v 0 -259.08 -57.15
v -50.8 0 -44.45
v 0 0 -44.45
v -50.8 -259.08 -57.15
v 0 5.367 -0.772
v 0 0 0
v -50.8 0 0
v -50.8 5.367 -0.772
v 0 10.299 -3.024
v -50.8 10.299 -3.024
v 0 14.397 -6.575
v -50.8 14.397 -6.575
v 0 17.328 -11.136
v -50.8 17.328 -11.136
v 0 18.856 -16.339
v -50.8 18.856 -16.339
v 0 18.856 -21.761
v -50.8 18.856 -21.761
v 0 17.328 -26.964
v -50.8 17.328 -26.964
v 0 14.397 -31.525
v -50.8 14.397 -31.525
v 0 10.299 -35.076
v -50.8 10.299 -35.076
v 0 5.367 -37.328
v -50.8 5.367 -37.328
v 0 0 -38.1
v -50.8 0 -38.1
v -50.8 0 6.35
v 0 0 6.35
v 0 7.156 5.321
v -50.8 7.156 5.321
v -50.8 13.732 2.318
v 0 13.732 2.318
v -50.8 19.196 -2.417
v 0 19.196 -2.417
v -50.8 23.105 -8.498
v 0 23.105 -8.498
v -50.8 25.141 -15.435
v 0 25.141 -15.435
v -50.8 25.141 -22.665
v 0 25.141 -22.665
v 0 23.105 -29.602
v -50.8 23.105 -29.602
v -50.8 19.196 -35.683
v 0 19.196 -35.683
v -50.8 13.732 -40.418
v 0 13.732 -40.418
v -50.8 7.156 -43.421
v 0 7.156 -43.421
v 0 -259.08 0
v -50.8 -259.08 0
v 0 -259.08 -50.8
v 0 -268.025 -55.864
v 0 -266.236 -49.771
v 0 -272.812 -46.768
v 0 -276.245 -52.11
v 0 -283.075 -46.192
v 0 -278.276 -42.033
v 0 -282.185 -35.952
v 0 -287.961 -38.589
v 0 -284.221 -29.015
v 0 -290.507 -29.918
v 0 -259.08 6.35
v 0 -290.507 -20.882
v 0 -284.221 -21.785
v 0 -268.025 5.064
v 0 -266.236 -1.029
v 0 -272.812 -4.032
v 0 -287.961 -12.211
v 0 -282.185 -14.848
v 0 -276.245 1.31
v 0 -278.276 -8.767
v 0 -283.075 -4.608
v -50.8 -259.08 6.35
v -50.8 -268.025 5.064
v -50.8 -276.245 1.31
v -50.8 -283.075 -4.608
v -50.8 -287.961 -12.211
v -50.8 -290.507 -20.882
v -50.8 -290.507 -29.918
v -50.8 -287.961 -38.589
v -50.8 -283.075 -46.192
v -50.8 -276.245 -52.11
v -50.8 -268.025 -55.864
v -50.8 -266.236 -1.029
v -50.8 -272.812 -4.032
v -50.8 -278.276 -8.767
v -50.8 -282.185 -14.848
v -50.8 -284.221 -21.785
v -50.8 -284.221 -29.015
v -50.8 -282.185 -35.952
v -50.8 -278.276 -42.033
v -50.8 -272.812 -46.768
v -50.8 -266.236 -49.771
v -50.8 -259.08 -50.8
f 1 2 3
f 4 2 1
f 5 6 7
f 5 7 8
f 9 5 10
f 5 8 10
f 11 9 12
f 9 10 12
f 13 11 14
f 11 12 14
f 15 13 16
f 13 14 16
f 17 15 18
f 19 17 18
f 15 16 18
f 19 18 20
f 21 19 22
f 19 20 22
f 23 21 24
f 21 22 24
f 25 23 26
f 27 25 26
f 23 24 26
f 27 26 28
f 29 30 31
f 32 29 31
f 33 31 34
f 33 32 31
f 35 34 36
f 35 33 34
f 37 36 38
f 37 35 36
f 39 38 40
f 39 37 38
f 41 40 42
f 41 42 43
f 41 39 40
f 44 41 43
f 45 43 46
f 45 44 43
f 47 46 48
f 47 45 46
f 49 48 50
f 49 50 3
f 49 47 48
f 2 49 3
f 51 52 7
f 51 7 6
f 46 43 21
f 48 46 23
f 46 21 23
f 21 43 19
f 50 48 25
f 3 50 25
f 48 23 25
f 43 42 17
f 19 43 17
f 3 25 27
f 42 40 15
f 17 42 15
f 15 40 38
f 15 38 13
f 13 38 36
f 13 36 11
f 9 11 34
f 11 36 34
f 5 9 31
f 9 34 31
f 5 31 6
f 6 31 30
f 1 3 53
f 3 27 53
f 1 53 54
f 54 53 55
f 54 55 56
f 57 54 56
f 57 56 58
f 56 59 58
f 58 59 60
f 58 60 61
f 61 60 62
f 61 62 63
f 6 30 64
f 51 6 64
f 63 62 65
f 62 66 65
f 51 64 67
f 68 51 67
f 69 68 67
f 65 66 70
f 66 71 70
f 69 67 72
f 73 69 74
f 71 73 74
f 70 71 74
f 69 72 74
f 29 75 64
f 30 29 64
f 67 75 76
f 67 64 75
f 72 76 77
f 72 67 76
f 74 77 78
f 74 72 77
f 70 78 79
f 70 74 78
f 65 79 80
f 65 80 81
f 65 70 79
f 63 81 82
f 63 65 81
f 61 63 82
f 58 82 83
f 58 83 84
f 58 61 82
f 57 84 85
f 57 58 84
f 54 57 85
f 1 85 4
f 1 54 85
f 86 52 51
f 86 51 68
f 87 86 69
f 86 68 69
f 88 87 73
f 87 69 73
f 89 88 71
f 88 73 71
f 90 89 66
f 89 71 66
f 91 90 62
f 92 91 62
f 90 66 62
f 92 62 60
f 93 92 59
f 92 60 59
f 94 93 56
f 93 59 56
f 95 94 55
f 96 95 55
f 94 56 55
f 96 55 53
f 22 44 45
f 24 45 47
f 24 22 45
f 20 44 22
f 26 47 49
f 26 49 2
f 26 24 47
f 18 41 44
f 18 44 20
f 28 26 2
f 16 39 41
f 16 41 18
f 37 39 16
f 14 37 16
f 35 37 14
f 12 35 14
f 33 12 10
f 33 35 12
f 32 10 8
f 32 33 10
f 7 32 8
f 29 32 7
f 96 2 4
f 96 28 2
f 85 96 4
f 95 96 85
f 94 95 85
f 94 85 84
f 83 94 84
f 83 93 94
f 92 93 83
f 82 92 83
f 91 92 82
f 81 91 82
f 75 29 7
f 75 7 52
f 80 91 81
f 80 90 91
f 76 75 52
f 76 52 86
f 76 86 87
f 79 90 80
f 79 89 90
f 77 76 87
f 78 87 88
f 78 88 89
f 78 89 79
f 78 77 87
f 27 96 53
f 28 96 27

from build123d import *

# Parameters (mm, degrees)
F0_W     = 50.8
F0_H     = 6.35
F1_DEPTH = 259.08
F2_W     = 50.8
F2_H     = 6.35
F3_ANGLE = -180
F4_W     = 50.8
F4_H     = 6.35
F5_ANGLE = 180
F7_DEPTH = 50.8


with BuildPart() as f1:
    # F0 (on Front) → F1 (new body)
    with BuildSketch(Plane.XZ):
        with Locations((-25.4, 3.175)):
            Rectangle(F0_W, F0_H)
    extrude(amount=F1_DEPTH)

    # F2 (on face) → F3 (revolve)
    with BuildSketch(Plane.XZ.offset(259.08)):
        with Locations((-25.4, 3.175)):
            Rectangle(F2_W, F2_H)
    revolve(axis=Axis((-25.4, -259.08, -25.4), (-1, 0, 0)), revolution_arc=F3_ANGLE)

    # F4 (on face) → F5 (revolve)
    with BuildSketch(Plane(origin=(0, 0, 0), x_dir=(-1, 0, 0), z_dir=(0, 1, 0))):
        with Locations((25.4, 3.175)):
            Rectangle(F4_W, F4_H)
    revolve(axis=Axis((-31.75, 0, -19.05), (-1, 0, 0)), revolution_arc=F5_ANGLE)

    # F6 (on face) → F7 (join)
    with BuildSketch(Plane(origin=(-50.8, 0, 0), x_dir=(0, -1, 0), z_dir=(-1, 0, 0))):
        Polygon((259.08, -50.8), (0, -38.1), (0, -44.45), (259.08, -57.15), align=None)
    extrude(amount=-F7_DEPTH)


solid = f1.part
